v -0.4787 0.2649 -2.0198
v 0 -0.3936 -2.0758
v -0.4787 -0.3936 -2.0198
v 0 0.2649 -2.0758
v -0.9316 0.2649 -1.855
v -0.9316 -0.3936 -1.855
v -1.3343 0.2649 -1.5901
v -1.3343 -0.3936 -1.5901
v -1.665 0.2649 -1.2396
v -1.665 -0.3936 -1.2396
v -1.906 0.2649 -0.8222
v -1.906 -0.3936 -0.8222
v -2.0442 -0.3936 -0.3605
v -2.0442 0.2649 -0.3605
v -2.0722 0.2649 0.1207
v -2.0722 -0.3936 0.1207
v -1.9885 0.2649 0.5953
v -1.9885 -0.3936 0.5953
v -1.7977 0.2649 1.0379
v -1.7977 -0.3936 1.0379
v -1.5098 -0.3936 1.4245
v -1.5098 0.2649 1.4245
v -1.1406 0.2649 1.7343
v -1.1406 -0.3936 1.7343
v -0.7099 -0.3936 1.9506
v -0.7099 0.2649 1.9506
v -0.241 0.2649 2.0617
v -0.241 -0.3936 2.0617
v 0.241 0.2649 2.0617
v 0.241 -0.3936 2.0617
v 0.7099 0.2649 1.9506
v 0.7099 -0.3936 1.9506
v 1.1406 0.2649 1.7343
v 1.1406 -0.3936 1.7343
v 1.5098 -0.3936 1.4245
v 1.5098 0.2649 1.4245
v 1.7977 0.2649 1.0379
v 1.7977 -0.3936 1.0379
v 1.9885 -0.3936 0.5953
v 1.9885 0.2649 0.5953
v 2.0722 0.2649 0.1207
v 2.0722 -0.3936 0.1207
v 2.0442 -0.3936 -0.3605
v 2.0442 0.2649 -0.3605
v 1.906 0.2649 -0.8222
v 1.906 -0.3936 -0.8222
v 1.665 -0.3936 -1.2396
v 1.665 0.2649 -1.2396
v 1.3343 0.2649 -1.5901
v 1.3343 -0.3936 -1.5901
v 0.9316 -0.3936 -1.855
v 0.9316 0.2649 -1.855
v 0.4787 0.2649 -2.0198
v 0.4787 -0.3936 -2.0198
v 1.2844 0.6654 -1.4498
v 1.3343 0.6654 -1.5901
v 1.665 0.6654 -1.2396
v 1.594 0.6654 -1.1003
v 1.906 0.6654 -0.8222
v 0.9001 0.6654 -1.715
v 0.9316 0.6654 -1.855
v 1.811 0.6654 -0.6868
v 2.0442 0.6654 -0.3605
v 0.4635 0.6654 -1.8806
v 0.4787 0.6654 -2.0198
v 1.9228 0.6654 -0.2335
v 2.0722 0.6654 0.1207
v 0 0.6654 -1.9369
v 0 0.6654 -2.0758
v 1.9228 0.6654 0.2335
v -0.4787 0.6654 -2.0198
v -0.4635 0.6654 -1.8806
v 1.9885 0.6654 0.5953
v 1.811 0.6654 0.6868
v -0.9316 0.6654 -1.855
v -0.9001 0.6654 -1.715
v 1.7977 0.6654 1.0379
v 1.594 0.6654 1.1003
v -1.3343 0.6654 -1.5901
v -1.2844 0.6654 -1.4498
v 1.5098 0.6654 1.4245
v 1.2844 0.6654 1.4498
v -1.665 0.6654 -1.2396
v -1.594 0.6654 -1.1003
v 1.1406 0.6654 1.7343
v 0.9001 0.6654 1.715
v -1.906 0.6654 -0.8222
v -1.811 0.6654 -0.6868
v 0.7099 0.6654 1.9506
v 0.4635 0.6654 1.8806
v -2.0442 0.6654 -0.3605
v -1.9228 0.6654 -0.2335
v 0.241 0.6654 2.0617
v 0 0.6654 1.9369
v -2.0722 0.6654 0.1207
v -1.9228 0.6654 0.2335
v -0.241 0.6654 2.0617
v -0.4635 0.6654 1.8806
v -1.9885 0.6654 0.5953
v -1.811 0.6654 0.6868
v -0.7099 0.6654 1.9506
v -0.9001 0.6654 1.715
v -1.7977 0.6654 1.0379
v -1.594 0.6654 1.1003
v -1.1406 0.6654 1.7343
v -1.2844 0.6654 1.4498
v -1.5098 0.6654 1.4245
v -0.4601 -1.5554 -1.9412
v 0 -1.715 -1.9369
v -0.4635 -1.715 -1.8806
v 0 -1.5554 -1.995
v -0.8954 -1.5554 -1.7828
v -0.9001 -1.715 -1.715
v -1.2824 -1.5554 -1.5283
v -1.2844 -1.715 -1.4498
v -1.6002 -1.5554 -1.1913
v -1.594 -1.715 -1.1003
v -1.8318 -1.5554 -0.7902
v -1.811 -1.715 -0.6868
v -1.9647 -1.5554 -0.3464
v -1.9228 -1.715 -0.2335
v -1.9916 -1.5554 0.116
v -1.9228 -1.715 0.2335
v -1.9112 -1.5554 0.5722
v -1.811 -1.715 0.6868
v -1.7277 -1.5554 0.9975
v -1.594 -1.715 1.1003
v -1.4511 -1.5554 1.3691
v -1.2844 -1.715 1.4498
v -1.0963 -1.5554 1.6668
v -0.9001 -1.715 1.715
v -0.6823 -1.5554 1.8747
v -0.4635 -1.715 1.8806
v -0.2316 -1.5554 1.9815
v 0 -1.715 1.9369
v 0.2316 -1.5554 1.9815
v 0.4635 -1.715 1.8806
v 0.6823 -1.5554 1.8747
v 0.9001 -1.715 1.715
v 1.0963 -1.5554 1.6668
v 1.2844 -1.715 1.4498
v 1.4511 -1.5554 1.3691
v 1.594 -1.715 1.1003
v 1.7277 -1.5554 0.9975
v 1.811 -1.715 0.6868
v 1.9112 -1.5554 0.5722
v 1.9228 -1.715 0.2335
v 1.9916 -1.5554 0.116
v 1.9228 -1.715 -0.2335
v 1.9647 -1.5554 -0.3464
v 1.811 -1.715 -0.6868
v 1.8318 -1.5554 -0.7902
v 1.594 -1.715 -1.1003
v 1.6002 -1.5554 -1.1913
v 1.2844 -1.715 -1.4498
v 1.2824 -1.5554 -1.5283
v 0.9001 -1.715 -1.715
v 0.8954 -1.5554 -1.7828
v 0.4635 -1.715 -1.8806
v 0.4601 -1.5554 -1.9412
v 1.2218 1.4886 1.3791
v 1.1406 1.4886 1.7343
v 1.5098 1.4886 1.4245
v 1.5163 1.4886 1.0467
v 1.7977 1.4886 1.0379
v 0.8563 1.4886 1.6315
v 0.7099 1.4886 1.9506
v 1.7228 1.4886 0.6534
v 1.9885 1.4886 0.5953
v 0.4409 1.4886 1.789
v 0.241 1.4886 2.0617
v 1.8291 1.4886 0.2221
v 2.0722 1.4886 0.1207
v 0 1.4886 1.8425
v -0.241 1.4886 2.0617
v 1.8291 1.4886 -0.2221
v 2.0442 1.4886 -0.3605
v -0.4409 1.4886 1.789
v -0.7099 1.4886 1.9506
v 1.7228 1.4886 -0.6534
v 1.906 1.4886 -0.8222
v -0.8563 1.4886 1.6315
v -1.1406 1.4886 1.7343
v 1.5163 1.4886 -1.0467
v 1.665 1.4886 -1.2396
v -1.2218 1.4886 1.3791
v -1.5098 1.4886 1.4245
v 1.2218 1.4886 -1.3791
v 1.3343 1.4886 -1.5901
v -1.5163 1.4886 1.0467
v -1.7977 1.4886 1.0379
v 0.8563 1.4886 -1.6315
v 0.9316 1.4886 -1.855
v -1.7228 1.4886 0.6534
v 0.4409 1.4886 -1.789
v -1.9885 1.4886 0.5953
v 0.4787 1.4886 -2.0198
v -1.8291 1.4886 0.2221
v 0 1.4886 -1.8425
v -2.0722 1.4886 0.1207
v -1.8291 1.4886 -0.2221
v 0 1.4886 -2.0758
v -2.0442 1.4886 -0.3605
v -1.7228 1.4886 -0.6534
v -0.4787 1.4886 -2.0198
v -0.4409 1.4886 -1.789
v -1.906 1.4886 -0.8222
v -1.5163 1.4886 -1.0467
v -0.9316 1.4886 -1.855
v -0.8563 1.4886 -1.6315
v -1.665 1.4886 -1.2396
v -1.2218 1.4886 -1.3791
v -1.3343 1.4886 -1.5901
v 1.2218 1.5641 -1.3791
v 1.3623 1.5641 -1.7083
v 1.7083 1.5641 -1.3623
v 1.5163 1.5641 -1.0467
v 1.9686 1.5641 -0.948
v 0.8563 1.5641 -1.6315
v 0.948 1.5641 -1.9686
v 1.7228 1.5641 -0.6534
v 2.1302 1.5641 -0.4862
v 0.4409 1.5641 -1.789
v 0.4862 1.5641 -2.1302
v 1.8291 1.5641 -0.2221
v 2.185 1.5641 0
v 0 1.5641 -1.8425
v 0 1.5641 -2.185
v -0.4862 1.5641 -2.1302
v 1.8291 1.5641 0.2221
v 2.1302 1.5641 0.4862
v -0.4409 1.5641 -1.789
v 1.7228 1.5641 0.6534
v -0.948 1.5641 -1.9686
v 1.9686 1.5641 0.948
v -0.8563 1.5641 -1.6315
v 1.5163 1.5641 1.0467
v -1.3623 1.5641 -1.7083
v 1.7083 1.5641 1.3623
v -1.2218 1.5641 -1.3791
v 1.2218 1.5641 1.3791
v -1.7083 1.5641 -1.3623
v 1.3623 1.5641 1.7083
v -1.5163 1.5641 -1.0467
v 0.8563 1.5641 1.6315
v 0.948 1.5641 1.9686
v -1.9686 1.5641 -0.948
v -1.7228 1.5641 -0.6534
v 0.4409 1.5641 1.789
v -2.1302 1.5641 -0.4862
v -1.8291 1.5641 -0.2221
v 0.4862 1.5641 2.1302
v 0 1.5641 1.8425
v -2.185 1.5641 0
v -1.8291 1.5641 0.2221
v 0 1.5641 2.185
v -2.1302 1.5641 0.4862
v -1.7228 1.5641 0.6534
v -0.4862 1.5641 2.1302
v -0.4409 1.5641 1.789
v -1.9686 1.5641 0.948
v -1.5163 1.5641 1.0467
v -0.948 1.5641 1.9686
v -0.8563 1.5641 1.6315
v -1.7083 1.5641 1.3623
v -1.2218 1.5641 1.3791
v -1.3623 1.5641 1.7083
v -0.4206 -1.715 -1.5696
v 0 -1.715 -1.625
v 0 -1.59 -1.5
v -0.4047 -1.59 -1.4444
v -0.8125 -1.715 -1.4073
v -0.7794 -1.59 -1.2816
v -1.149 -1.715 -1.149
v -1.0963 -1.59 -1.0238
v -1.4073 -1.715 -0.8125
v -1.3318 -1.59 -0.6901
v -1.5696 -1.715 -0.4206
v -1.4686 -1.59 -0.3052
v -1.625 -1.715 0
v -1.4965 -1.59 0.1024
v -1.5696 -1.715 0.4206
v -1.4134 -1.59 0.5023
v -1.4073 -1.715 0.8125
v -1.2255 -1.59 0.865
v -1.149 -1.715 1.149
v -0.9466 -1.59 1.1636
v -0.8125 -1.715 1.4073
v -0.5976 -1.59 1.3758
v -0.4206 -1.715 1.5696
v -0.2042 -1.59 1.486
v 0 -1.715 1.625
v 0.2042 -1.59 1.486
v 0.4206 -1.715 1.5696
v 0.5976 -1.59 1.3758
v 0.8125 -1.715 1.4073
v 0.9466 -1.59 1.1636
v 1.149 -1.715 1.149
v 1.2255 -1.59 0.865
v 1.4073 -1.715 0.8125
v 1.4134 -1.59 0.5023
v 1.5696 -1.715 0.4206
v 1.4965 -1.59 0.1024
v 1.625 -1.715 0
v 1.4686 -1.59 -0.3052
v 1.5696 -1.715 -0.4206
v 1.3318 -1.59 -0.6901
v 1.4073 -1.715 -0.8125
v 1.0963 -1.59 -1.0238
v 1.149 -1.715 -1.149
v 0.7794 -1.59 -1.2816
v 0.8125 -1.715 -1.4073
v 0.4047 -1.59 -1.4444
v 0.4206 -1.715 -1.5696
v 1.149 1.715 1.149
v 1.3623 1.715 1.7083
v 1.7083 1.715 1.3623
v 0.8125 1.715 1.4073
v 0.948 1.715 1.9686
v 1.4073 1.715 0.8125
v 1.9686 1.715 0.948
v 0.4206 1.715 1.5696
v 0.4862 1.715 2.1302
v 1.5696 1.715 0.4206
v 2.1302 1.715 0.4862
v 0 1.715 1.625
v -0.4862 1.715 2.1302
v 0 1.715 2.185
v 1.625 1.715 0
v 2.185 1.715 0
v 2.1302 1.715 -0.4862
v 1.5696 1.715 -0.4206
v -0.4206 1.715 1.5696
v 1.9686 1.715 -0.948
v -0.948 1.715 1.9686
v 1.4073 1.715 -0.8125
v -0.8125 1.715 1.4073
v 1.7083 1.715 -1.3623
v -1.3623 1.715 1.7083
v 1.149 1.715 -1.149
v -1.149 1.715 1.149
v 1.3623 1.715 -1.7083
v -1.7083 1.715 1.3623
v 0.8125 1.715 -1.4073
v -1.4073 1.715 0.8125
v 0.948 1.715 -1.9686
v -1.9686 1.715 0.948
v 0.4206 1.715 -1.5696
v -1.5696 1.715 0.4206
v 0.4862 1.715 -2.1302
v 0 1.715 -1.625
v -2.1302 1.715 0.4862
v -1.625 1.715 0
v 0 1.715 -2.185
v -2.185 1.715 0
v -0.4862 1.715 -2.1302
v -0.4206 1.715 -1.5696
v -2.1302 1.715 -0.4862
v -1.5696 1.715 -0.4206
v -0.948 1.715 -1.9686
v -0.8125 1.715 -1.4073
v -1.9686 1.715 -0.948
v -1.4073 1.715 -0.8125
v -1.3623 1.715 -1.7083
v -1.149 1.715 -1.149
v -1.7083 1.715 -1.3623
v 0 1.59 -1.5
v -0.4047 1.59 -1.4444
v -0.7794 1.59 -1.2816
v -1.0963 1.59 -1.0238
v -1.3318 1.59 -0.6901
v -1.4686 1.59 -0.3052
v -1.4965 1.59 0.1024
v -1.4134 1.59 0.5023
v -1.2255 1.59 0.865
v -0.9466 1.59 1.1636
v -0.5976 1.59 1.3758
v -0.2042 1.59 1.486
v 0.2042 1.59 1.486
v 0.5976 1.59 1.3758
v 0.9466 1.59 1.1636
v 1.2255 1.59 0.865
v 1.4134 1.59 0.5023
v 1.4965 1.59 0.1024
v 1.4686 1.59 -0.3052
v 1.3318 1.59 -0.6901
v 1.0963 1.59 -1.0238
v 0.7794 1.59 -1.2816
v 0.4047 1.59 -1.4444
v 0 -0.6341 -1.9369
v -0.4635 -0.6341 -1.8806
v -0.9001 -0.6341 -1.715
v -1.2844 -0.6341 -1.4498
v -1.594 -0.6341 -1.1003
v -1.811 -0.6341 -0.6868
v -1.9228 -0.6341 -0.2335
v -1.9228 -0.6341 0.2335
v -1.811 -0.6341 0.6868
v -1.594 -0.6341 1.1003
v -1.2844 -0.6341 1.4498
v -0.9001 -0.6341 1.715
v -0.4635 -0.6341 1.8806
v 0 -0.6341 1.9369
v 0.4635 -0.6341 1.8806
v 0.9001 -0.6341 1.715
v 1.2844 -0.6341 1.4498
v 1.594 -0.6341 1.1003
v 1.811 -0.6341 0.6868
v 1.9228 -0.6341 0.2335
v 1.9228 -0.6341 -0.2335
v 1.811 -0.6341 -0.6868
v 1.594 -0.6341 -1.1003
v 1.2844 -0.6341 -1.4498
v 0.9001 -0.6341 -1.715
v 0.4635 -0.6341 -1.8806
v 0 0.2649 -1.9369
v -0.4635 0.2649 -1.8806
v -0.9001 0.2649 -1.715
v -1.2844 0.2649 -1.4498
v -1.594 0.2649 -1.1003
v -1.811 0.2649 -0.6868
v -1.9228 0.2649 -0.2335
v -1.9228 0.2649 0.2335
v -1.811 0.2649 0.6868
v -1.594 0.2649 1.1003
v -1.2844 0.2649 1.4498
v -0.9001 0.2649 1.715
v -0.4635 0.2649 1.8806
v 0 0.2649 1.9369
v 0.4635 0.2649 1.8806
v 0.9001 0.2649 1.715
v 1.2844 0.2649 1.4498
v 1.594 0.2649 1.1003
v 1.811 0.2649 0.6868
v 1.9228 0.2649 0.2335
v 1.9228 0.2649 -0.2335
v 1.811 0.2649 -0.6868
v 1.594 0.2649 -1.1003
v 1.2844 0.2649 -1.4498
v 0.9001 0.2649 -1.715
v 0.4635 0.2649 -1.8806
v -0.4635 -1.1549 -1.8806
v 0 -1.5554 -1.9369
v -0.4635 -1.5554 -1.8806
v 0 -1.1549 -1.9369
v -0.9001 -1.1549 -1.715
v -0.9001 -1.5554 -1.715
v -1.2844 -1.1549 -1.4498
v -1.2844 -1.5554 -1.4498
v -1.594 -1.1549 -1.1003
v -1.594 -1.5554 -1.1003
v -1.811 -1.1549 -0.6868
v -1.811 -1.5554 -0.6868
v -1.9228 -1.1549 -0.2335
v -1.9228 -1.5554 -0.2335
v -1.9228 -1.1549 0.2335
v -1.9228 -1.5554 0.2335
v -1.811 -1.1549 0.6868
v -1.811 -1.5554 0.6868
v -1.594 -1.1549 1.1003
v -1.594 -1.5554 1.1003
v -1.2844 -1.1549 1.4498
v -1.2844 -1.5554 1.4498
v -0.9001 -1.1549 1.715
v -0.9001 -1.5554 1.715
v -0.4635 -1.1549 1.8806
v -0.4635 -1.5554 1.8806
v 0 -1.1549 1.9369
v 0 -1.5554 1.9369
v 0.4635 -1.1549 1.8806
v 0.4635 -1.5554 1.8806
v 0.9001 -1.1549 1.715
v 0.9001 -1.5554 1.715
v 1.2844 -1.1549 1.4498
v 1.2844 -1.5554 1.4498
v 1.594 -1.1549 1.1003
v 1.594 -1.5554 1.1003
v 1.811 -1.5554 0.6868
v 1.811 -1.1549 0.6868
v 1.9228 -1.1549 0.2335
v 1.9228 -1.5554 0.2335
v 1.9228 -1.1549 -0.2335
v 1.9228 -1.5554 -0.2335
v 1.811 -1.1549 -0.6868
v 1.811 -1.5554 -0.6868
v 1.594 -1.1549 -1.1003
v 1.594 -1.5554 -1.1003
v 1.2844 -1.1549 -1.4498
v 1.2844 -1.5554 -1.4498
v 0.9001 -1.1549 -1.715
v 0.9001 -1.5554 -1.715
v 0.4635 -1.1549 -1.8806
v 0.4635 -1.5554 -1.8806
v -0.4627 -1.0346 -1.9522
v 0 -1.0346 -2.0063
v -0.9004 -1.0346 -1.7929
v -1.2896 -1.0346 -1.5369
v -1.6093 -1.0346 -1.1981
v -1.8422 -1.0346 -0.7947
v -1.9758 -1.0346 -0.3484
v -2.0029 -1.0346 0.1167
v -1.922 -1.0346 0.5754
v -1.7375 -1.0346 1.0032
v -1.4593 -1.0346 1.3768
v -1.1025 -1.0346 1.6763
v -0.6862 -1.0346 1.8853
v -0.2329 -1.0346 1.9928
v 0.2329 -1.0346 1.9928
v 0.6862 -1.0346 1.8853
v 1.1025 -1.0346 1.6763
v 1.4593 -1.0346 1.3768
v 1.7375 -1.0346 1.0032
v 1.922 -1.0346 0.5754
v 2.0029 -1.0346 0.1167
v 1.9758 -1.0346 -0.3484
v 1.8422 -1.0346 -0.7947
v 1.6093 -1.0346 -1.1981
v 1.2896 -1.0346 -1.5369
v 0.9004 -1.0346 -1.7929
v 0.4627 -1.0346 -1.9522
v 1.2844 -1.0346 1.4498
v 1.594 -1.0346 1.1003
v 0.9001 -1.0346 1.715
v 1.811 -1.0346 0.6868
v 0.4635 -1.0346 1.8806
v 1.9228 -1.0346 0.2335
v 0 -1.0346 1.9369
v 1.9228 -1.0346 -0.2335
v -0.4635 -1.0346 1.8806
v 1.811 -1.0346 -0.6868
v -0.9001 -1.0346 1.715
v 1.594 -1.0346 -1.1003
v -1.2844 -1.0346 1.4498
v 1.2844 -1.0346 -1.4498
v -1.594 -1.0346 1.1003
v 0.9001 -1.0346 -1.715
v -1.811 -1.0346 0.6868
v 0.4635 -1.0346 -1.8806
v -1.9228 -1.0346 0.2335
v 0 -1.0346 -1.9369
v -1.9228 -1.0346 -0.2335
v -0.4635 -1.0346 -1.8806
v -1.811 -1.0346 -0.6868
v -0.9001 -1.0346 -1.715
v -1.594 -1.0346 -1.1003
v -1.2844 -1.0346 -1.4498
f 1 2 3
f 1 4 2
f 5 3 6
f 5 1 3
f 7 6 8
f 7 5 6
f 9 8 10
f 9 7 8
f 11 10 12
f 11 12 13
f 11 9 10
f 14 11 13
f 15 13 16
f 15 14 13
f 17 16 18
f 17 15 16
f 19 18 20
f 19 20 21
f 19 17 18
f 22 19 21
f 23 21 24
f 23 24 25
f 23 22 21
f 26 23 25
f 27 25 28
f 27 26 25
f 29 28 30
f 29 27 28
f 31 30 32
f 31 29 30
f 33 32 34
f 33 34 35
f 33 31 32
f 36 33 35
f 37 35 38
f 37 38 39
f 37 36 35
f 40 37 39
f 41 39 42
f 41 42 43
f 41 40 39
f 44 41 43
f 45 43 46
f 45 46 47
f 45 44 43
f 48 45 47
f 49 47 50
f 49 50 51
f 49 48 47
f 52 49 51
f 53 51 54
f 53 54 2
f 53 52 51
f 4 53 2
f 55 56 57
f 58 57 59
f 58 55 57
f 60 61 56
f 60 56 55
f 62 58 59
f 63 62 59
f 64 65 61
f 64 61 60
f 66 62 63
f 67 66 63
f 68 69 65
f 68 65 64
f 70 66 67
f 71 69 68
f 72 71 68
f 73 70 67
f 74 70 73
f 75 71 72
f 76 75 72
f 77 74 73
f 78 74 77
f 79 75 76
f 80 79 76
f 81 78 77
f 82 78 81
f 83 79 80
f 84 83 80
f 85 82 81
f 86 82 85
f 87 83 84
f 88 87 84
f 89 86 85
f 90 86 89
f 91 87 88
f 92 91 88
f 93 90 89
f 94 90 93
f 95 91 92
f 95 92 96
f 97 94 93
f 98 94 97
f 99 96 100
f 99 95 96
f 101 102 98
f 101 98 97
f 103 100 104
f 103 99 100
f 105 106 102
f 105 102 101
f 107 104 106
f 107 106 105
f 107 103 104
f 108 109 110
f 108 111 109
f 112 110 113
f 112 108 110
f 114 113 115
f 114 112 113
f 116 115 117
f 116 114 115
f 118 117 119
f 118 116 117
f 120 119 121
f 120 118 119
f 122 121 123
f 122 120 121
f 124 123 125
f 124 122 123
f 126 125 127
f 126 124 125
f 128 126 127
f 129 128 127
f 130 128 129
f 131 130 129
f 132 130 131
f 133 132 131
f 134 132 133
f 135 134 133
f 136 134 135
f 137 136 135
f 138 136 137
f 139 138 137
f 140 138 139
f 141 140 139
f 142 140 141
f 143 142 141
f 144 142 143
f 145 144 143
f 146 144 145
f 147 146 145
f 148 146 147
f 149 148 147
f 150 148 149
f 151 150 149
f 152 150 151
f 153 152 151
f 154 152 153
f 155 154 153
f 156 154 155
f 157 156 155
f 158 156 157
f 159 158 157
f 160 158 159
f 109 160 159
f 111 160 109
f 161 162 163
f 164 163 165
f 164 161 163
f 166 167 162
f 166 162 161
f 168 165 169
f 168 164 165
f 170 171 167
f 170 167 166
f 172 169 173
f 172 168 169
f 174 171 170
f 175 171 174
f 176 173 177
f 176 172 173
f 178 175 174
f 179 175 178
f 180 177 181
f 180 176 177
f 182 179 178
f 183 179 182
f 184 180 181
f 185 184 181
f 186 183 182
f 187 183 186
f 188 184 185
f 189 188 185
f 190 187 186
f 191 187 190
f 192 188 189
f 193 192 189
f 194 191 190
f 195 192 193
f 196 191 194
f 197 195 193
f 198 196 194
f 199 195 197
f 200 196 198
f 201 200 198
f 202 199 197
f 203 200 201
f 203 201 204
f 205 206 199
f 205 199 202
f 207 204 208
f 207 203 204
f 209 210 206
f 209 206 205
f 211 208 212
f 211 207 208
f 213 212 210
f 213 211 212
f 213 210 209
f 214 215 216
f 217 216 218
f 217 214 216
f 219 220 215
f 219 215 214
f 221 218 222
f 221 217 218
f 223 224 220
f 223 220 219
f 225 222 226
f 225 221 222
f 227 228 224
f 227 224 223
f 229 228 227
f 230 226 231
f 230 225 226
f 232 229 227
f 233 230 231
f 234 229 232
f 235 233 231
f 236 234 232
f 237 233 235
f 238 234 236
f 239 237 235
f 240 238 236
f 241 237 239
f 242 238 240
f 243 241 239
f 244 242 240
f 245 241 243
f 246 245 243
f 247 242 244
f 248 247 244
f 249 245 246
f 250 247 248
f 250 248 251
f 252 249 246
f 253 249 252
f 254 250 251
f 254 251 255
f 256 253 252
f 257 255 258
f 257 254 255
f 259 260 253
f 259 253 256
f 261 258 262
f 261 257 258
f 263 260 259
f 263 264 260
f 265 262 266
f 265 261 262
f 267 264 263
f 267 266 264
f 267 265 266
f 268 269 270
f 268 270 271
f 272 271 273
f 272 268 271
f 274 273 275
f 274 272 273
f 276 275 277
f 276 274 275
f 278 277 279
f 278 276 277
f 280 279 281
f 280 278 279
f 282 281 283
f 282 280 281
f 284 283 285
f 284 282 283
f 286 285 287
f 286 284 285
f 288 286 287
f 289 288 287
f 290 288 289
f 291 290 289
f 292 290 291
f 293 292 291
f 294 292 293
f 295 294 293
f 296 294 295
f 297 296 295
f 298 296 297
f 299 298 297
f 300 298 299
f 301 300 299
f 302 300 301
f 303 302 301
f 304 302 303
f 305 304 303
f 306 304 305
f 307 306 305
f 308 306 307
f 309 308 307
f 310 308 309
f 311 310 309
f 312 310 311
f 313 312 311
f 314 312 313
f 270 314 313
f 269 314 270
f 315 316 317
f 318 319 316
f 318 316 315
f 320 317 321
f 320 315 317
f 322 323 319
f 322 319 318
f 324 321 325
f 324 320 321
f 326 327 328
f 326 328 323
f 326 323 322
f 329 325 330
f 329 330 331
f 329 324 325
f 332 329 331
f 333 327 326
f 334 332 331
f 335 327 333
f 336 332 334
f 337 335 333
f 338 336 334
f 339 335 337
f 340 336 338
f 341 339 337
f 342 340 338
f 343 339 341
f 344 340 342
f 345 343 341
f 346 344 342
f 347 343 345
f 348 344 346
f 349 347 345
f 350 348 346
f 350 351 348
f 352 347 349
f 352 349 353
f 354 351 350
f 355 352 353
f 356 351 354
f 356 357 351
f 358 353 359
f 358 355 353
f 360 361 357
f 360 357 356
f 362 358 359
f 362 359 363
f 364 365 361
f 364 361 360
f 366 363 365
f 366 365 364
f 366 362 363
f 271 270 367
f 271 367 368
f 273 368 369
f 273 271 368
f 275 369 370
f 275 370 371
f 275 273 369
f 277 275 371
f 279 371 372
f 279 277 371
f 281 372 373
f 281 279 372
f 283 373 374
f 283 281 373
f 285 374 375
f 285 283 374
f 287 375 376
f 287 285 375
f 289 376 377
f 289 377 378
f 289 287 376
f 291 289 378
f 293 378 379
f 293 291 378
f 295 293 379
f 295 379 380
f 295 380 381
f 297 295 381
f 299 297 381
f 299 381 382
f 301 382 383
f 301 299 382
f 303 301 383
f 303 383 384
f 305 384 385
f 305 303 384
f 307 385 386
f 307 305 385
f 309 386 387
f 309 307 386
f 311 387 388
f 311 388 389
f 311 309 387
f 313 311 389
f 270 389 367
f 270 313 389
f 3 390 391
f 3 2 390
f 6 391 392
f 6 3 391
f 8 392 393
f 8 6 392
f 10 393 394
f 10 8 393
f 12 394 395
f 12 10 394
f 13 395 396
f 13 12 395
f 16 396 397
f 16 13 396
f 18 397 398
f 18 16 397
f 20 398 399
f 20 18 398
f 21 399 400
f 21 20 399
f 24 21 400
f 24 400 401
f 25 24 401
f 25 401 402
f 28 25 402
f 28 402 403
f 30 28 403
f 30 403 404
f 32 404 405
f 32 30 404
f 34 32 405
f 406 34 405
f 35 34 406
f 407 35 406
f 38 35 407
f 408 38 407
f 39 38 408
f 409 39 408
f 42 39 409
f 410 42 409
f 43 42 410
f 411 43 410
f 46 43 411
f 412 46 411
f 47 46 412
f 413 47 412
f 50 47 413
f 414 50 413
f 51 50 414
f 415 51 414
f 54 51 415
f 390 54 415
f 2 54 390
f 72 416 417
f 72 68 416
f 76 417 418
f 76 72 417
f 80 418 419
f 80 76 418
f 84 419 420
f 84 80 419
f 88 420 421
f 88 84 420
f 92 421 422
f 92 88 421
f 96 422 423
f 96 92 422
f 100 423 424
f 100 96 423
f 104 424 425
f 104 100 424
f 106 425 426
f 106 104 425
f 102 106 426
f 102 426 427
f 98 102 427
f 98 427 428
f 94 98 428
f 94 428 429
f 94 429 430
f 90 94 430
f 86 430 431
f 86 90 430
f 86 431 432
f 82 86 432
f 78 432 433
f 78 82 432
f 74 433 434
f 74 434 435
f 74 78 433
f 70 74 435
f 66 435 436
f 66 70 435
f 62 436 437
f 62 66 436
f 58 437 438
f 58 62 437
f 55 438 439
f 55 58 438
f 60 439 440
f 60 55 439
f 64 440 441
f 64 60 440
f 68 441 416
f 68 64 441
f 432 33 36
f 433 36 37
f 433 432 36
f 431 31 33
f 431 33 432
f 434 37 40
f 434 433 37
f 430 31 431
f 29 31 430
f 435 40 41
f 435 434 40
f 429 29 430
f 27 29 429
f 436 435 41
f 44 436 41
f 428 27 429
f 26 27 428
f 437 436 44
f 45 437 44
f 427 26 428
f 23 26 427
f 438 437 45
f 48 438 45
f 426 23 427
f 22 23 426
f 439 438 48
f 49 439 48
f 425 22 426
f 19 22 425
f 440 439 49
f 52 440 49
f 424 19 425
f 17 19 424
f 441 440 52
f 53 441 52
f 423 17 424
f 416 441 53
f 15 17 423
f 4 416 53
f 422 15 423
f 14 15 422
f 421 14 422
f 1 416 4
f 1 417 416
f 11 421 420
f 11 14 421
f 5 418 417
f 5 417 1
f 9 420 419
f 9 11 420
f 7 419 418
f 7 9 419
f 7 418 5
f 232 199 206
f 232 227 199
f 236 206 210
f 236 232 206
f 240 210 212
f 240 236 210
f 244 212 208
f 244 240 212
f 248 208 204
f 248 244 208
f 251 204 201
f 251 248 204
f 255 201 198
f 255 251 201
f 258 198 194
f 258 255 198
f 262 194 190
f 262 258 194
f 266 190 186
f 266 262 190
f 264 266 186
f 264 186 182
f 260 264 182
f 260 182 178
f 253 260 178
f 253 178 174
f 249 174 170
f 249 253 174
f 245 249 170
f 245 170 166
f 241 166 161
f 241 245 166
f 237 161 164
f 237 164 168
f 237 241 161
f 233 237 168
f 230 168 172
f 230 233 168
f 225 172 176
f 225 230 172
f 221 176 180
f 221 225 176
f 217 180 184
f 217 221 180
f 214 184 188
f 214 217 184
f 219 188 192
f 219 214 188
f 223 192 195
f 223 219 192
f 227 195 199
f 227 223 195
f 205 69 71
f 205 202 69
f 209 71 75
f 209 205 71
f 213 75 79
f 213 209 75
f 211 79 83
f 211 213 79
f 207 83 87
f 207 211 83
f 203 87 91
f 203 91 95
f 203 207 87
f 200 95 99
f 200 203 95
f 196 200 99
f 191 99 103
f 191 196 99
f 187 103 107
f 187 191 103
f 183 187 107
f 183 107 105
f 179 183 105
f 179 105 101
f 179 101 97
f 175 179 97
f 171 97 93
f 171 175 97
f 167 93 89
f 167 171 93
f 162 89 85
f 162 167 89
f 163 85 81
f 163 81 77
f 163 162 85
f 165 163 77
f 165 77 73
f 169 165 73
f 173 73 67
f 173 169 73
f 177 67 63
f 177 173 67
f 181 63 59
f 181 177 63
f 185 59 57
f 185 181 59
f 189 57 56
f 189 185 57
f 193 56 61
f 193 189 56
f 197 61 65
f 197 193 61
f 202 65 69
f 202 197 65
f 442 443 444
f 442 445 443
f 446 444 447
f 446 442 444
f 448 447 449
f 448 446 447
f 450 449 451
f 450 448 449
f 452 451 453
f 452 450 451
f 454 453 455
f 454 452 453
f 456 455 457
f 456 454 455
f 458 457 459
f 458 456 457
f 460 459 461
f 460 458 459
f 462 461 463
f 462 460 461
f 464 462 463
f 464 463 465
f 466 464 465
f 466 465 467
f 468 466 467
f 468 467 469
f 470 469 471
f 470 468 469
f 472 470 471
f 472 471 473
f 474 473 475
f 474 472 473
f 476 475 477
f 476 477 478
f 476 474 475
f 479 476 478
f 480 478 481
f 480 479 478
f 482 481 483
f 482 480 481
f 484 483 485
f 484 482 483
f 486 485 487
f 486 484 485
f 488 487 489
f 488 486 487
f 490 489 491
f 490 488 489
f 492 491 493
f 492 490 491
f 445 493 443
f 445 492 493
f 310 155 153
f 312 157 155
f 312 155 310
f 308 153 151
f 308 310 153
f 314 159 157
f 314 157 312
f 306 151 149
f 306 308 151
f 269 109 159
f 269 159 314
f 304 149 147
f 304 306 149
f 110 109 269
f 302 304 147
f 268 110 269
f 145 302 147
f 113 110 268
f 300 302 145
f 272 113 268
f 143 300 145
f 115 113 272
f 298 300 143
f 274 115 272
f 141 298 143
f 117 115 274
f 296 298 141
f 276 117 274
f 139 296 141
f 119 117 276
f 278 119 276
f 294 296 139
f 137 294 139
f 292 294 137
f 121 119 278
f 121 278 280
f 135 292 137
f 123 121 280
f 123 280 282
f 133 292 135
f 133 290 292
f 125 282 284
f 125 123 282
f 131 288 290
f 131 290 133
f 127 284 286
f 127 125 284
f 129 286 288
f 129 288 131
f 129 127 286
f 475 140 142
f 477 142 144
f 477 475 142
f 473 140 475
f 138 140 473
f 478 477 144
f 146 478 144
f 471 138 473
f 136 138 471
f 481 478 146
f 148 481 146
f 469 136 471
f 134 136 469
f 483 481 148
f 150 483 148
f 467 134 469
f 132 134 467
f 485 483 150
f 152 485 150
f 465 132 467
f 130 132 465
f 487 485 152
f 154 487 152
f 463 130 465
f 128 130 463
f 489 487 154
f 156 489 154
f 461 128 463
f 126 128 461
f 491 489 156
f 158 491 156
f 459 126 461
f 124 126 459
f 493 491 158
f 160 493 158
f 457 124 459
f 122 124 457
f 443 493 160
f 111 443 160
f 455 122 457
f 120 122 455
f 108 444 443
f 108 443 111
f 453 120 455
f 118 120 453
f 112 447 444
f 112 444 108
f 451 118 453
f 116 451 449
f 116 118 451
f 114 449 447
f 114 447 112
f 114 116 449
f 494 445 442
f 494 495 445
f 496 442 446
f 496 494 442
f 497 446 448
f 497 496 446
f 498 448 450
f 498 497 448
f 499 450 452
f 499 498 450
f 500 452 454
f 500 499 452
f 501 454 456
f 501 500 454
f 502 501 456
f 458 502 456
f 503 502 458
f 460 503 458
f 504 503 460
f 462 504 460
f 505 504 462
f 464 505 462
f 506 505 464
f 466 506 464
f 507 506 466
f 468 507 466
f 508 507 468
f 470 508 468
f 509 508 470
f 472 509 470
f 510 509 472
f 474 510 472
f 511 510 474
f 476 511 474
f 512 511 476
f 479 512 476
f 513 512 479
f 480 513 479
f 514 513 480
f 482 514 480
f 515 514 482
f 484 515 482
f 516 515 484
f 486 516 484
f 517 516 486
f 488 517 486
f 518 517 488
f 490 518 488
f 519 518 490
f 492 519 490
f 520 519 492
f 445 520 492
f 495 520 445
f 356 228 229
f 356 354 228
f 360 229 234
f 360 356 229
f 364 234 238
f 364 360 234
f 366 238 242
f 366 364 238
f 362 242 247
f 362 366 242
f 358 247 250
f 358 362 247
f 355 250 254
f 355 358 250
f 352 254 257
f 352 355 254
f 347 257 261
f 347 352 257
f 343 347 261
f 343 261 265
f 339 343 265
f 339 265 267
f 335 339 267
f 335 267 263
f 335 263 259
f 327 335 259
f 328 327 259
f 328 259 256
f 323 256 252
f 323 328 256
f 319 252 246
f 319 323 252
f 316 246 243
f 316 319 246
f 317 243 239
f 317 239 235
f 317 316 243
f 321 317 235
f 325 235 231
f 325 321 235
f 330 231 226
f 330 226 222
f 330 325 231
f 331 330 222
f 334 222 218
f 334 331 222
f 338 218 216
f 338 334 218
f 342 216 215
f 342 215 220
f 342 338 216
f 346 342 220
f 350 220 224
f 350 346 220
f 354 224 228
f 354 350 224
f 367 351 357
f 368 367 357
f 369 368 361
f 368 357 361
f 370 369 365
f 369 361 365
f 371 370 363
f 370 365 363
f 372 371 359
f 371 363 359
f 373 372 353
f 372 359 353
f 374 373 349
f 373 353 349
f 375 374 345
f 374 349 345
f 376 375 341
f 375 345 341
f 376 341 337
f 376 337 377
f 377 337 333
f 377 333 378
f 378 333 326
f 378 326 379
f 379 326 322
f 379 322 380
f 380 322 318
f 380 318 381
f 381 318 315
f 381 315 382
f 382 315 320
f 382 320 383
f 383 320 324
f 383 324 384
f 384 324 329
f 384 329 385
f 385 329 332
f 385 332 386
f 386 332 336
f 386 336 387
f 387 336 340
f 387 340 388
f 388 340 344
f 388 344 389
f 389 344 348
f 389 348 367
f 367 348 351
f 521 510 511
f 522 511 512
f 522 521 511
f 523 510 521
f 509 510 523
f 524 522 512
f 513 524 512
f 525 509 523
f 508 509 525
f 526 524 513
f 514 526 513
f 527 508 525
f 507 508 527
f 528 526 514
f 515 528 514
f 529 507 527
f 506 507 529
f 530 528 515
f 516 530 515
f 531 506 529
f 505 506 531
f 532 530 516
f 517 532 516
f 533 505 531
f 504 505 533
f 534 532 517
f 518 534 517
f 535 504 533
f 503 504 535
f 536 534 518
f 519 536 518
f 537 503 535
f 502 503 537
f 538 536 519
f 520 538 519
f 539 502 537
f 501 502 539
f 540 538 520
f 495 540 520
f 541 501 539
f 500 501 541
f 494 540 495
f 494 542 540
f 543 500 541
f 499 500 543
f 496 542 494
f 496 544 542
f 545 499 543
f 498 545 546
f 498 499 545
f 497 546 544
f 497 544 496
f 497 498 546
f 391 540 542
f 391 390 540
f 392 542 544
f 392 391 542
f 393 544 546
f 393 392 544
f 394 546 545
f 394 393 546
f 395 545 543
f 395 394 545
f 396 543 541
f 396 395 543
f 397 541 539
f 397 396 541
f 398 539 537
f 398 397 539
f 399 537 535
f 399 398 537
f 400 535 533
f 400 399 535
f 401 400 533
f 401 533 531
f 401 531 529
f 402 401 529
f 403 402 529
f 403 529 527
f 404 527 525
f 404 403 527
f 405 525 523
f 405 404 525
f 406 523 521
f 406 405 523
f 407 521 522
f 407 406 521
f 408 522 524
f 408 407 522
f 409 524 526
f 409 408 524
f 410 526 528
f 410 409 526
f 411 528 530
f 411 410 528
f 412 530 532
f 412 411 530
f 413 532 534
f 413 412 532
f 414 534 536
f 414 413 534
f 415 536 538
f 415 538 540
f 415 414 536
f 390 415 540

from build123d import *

# Parameters (mm, degrees)
CHAMFER1_SIZE = 0.125


with BuildPart() as part:
    # Sketch2 → Revolve1 (revolve)
    with BuildSketch(Plane(origin=(0, 0, 0), x_dir=(0, 0, -1), z_dir=(1, 0, 0))):
        Polygon((-1.5, 1.715), (-1.5, -1.715), (-1.936893204, -1.715), (-1.995, -1.55535289), (-1.936893204, -1.55535289), (-1.936893204, -1.154868773), (-2.006321602, -1.03461526), (-1.936893204, -1.03461526), (-1.936893204, -0.634131143), (-2.07575, -0.393624117), (-2.07575, 0.264935883), (-1.936893204, 0.264935883), (-1.936893204, 0.66542), (-2.07575, 0.66542), (-2.07575, 1.48862), (-1.8425, 1.48862), (-1.8425, 1.56408), (-2.185, 1.56408), (-2.185, 1.715), align=None)
    revolve(axis=Axis((0, -1.715, 0), (0, 1, 0)))

    # Chamfer1
    chamfer1_edges = [part.edges().sort_by_distance(p)[0] for p in [
        (0, -1.715, -1.5),
        (0, 1.715, -1.5),
    ]]
    chamfer(chamfer1_edges, length=CHAMFER1_SIZE)


solid = part.part
